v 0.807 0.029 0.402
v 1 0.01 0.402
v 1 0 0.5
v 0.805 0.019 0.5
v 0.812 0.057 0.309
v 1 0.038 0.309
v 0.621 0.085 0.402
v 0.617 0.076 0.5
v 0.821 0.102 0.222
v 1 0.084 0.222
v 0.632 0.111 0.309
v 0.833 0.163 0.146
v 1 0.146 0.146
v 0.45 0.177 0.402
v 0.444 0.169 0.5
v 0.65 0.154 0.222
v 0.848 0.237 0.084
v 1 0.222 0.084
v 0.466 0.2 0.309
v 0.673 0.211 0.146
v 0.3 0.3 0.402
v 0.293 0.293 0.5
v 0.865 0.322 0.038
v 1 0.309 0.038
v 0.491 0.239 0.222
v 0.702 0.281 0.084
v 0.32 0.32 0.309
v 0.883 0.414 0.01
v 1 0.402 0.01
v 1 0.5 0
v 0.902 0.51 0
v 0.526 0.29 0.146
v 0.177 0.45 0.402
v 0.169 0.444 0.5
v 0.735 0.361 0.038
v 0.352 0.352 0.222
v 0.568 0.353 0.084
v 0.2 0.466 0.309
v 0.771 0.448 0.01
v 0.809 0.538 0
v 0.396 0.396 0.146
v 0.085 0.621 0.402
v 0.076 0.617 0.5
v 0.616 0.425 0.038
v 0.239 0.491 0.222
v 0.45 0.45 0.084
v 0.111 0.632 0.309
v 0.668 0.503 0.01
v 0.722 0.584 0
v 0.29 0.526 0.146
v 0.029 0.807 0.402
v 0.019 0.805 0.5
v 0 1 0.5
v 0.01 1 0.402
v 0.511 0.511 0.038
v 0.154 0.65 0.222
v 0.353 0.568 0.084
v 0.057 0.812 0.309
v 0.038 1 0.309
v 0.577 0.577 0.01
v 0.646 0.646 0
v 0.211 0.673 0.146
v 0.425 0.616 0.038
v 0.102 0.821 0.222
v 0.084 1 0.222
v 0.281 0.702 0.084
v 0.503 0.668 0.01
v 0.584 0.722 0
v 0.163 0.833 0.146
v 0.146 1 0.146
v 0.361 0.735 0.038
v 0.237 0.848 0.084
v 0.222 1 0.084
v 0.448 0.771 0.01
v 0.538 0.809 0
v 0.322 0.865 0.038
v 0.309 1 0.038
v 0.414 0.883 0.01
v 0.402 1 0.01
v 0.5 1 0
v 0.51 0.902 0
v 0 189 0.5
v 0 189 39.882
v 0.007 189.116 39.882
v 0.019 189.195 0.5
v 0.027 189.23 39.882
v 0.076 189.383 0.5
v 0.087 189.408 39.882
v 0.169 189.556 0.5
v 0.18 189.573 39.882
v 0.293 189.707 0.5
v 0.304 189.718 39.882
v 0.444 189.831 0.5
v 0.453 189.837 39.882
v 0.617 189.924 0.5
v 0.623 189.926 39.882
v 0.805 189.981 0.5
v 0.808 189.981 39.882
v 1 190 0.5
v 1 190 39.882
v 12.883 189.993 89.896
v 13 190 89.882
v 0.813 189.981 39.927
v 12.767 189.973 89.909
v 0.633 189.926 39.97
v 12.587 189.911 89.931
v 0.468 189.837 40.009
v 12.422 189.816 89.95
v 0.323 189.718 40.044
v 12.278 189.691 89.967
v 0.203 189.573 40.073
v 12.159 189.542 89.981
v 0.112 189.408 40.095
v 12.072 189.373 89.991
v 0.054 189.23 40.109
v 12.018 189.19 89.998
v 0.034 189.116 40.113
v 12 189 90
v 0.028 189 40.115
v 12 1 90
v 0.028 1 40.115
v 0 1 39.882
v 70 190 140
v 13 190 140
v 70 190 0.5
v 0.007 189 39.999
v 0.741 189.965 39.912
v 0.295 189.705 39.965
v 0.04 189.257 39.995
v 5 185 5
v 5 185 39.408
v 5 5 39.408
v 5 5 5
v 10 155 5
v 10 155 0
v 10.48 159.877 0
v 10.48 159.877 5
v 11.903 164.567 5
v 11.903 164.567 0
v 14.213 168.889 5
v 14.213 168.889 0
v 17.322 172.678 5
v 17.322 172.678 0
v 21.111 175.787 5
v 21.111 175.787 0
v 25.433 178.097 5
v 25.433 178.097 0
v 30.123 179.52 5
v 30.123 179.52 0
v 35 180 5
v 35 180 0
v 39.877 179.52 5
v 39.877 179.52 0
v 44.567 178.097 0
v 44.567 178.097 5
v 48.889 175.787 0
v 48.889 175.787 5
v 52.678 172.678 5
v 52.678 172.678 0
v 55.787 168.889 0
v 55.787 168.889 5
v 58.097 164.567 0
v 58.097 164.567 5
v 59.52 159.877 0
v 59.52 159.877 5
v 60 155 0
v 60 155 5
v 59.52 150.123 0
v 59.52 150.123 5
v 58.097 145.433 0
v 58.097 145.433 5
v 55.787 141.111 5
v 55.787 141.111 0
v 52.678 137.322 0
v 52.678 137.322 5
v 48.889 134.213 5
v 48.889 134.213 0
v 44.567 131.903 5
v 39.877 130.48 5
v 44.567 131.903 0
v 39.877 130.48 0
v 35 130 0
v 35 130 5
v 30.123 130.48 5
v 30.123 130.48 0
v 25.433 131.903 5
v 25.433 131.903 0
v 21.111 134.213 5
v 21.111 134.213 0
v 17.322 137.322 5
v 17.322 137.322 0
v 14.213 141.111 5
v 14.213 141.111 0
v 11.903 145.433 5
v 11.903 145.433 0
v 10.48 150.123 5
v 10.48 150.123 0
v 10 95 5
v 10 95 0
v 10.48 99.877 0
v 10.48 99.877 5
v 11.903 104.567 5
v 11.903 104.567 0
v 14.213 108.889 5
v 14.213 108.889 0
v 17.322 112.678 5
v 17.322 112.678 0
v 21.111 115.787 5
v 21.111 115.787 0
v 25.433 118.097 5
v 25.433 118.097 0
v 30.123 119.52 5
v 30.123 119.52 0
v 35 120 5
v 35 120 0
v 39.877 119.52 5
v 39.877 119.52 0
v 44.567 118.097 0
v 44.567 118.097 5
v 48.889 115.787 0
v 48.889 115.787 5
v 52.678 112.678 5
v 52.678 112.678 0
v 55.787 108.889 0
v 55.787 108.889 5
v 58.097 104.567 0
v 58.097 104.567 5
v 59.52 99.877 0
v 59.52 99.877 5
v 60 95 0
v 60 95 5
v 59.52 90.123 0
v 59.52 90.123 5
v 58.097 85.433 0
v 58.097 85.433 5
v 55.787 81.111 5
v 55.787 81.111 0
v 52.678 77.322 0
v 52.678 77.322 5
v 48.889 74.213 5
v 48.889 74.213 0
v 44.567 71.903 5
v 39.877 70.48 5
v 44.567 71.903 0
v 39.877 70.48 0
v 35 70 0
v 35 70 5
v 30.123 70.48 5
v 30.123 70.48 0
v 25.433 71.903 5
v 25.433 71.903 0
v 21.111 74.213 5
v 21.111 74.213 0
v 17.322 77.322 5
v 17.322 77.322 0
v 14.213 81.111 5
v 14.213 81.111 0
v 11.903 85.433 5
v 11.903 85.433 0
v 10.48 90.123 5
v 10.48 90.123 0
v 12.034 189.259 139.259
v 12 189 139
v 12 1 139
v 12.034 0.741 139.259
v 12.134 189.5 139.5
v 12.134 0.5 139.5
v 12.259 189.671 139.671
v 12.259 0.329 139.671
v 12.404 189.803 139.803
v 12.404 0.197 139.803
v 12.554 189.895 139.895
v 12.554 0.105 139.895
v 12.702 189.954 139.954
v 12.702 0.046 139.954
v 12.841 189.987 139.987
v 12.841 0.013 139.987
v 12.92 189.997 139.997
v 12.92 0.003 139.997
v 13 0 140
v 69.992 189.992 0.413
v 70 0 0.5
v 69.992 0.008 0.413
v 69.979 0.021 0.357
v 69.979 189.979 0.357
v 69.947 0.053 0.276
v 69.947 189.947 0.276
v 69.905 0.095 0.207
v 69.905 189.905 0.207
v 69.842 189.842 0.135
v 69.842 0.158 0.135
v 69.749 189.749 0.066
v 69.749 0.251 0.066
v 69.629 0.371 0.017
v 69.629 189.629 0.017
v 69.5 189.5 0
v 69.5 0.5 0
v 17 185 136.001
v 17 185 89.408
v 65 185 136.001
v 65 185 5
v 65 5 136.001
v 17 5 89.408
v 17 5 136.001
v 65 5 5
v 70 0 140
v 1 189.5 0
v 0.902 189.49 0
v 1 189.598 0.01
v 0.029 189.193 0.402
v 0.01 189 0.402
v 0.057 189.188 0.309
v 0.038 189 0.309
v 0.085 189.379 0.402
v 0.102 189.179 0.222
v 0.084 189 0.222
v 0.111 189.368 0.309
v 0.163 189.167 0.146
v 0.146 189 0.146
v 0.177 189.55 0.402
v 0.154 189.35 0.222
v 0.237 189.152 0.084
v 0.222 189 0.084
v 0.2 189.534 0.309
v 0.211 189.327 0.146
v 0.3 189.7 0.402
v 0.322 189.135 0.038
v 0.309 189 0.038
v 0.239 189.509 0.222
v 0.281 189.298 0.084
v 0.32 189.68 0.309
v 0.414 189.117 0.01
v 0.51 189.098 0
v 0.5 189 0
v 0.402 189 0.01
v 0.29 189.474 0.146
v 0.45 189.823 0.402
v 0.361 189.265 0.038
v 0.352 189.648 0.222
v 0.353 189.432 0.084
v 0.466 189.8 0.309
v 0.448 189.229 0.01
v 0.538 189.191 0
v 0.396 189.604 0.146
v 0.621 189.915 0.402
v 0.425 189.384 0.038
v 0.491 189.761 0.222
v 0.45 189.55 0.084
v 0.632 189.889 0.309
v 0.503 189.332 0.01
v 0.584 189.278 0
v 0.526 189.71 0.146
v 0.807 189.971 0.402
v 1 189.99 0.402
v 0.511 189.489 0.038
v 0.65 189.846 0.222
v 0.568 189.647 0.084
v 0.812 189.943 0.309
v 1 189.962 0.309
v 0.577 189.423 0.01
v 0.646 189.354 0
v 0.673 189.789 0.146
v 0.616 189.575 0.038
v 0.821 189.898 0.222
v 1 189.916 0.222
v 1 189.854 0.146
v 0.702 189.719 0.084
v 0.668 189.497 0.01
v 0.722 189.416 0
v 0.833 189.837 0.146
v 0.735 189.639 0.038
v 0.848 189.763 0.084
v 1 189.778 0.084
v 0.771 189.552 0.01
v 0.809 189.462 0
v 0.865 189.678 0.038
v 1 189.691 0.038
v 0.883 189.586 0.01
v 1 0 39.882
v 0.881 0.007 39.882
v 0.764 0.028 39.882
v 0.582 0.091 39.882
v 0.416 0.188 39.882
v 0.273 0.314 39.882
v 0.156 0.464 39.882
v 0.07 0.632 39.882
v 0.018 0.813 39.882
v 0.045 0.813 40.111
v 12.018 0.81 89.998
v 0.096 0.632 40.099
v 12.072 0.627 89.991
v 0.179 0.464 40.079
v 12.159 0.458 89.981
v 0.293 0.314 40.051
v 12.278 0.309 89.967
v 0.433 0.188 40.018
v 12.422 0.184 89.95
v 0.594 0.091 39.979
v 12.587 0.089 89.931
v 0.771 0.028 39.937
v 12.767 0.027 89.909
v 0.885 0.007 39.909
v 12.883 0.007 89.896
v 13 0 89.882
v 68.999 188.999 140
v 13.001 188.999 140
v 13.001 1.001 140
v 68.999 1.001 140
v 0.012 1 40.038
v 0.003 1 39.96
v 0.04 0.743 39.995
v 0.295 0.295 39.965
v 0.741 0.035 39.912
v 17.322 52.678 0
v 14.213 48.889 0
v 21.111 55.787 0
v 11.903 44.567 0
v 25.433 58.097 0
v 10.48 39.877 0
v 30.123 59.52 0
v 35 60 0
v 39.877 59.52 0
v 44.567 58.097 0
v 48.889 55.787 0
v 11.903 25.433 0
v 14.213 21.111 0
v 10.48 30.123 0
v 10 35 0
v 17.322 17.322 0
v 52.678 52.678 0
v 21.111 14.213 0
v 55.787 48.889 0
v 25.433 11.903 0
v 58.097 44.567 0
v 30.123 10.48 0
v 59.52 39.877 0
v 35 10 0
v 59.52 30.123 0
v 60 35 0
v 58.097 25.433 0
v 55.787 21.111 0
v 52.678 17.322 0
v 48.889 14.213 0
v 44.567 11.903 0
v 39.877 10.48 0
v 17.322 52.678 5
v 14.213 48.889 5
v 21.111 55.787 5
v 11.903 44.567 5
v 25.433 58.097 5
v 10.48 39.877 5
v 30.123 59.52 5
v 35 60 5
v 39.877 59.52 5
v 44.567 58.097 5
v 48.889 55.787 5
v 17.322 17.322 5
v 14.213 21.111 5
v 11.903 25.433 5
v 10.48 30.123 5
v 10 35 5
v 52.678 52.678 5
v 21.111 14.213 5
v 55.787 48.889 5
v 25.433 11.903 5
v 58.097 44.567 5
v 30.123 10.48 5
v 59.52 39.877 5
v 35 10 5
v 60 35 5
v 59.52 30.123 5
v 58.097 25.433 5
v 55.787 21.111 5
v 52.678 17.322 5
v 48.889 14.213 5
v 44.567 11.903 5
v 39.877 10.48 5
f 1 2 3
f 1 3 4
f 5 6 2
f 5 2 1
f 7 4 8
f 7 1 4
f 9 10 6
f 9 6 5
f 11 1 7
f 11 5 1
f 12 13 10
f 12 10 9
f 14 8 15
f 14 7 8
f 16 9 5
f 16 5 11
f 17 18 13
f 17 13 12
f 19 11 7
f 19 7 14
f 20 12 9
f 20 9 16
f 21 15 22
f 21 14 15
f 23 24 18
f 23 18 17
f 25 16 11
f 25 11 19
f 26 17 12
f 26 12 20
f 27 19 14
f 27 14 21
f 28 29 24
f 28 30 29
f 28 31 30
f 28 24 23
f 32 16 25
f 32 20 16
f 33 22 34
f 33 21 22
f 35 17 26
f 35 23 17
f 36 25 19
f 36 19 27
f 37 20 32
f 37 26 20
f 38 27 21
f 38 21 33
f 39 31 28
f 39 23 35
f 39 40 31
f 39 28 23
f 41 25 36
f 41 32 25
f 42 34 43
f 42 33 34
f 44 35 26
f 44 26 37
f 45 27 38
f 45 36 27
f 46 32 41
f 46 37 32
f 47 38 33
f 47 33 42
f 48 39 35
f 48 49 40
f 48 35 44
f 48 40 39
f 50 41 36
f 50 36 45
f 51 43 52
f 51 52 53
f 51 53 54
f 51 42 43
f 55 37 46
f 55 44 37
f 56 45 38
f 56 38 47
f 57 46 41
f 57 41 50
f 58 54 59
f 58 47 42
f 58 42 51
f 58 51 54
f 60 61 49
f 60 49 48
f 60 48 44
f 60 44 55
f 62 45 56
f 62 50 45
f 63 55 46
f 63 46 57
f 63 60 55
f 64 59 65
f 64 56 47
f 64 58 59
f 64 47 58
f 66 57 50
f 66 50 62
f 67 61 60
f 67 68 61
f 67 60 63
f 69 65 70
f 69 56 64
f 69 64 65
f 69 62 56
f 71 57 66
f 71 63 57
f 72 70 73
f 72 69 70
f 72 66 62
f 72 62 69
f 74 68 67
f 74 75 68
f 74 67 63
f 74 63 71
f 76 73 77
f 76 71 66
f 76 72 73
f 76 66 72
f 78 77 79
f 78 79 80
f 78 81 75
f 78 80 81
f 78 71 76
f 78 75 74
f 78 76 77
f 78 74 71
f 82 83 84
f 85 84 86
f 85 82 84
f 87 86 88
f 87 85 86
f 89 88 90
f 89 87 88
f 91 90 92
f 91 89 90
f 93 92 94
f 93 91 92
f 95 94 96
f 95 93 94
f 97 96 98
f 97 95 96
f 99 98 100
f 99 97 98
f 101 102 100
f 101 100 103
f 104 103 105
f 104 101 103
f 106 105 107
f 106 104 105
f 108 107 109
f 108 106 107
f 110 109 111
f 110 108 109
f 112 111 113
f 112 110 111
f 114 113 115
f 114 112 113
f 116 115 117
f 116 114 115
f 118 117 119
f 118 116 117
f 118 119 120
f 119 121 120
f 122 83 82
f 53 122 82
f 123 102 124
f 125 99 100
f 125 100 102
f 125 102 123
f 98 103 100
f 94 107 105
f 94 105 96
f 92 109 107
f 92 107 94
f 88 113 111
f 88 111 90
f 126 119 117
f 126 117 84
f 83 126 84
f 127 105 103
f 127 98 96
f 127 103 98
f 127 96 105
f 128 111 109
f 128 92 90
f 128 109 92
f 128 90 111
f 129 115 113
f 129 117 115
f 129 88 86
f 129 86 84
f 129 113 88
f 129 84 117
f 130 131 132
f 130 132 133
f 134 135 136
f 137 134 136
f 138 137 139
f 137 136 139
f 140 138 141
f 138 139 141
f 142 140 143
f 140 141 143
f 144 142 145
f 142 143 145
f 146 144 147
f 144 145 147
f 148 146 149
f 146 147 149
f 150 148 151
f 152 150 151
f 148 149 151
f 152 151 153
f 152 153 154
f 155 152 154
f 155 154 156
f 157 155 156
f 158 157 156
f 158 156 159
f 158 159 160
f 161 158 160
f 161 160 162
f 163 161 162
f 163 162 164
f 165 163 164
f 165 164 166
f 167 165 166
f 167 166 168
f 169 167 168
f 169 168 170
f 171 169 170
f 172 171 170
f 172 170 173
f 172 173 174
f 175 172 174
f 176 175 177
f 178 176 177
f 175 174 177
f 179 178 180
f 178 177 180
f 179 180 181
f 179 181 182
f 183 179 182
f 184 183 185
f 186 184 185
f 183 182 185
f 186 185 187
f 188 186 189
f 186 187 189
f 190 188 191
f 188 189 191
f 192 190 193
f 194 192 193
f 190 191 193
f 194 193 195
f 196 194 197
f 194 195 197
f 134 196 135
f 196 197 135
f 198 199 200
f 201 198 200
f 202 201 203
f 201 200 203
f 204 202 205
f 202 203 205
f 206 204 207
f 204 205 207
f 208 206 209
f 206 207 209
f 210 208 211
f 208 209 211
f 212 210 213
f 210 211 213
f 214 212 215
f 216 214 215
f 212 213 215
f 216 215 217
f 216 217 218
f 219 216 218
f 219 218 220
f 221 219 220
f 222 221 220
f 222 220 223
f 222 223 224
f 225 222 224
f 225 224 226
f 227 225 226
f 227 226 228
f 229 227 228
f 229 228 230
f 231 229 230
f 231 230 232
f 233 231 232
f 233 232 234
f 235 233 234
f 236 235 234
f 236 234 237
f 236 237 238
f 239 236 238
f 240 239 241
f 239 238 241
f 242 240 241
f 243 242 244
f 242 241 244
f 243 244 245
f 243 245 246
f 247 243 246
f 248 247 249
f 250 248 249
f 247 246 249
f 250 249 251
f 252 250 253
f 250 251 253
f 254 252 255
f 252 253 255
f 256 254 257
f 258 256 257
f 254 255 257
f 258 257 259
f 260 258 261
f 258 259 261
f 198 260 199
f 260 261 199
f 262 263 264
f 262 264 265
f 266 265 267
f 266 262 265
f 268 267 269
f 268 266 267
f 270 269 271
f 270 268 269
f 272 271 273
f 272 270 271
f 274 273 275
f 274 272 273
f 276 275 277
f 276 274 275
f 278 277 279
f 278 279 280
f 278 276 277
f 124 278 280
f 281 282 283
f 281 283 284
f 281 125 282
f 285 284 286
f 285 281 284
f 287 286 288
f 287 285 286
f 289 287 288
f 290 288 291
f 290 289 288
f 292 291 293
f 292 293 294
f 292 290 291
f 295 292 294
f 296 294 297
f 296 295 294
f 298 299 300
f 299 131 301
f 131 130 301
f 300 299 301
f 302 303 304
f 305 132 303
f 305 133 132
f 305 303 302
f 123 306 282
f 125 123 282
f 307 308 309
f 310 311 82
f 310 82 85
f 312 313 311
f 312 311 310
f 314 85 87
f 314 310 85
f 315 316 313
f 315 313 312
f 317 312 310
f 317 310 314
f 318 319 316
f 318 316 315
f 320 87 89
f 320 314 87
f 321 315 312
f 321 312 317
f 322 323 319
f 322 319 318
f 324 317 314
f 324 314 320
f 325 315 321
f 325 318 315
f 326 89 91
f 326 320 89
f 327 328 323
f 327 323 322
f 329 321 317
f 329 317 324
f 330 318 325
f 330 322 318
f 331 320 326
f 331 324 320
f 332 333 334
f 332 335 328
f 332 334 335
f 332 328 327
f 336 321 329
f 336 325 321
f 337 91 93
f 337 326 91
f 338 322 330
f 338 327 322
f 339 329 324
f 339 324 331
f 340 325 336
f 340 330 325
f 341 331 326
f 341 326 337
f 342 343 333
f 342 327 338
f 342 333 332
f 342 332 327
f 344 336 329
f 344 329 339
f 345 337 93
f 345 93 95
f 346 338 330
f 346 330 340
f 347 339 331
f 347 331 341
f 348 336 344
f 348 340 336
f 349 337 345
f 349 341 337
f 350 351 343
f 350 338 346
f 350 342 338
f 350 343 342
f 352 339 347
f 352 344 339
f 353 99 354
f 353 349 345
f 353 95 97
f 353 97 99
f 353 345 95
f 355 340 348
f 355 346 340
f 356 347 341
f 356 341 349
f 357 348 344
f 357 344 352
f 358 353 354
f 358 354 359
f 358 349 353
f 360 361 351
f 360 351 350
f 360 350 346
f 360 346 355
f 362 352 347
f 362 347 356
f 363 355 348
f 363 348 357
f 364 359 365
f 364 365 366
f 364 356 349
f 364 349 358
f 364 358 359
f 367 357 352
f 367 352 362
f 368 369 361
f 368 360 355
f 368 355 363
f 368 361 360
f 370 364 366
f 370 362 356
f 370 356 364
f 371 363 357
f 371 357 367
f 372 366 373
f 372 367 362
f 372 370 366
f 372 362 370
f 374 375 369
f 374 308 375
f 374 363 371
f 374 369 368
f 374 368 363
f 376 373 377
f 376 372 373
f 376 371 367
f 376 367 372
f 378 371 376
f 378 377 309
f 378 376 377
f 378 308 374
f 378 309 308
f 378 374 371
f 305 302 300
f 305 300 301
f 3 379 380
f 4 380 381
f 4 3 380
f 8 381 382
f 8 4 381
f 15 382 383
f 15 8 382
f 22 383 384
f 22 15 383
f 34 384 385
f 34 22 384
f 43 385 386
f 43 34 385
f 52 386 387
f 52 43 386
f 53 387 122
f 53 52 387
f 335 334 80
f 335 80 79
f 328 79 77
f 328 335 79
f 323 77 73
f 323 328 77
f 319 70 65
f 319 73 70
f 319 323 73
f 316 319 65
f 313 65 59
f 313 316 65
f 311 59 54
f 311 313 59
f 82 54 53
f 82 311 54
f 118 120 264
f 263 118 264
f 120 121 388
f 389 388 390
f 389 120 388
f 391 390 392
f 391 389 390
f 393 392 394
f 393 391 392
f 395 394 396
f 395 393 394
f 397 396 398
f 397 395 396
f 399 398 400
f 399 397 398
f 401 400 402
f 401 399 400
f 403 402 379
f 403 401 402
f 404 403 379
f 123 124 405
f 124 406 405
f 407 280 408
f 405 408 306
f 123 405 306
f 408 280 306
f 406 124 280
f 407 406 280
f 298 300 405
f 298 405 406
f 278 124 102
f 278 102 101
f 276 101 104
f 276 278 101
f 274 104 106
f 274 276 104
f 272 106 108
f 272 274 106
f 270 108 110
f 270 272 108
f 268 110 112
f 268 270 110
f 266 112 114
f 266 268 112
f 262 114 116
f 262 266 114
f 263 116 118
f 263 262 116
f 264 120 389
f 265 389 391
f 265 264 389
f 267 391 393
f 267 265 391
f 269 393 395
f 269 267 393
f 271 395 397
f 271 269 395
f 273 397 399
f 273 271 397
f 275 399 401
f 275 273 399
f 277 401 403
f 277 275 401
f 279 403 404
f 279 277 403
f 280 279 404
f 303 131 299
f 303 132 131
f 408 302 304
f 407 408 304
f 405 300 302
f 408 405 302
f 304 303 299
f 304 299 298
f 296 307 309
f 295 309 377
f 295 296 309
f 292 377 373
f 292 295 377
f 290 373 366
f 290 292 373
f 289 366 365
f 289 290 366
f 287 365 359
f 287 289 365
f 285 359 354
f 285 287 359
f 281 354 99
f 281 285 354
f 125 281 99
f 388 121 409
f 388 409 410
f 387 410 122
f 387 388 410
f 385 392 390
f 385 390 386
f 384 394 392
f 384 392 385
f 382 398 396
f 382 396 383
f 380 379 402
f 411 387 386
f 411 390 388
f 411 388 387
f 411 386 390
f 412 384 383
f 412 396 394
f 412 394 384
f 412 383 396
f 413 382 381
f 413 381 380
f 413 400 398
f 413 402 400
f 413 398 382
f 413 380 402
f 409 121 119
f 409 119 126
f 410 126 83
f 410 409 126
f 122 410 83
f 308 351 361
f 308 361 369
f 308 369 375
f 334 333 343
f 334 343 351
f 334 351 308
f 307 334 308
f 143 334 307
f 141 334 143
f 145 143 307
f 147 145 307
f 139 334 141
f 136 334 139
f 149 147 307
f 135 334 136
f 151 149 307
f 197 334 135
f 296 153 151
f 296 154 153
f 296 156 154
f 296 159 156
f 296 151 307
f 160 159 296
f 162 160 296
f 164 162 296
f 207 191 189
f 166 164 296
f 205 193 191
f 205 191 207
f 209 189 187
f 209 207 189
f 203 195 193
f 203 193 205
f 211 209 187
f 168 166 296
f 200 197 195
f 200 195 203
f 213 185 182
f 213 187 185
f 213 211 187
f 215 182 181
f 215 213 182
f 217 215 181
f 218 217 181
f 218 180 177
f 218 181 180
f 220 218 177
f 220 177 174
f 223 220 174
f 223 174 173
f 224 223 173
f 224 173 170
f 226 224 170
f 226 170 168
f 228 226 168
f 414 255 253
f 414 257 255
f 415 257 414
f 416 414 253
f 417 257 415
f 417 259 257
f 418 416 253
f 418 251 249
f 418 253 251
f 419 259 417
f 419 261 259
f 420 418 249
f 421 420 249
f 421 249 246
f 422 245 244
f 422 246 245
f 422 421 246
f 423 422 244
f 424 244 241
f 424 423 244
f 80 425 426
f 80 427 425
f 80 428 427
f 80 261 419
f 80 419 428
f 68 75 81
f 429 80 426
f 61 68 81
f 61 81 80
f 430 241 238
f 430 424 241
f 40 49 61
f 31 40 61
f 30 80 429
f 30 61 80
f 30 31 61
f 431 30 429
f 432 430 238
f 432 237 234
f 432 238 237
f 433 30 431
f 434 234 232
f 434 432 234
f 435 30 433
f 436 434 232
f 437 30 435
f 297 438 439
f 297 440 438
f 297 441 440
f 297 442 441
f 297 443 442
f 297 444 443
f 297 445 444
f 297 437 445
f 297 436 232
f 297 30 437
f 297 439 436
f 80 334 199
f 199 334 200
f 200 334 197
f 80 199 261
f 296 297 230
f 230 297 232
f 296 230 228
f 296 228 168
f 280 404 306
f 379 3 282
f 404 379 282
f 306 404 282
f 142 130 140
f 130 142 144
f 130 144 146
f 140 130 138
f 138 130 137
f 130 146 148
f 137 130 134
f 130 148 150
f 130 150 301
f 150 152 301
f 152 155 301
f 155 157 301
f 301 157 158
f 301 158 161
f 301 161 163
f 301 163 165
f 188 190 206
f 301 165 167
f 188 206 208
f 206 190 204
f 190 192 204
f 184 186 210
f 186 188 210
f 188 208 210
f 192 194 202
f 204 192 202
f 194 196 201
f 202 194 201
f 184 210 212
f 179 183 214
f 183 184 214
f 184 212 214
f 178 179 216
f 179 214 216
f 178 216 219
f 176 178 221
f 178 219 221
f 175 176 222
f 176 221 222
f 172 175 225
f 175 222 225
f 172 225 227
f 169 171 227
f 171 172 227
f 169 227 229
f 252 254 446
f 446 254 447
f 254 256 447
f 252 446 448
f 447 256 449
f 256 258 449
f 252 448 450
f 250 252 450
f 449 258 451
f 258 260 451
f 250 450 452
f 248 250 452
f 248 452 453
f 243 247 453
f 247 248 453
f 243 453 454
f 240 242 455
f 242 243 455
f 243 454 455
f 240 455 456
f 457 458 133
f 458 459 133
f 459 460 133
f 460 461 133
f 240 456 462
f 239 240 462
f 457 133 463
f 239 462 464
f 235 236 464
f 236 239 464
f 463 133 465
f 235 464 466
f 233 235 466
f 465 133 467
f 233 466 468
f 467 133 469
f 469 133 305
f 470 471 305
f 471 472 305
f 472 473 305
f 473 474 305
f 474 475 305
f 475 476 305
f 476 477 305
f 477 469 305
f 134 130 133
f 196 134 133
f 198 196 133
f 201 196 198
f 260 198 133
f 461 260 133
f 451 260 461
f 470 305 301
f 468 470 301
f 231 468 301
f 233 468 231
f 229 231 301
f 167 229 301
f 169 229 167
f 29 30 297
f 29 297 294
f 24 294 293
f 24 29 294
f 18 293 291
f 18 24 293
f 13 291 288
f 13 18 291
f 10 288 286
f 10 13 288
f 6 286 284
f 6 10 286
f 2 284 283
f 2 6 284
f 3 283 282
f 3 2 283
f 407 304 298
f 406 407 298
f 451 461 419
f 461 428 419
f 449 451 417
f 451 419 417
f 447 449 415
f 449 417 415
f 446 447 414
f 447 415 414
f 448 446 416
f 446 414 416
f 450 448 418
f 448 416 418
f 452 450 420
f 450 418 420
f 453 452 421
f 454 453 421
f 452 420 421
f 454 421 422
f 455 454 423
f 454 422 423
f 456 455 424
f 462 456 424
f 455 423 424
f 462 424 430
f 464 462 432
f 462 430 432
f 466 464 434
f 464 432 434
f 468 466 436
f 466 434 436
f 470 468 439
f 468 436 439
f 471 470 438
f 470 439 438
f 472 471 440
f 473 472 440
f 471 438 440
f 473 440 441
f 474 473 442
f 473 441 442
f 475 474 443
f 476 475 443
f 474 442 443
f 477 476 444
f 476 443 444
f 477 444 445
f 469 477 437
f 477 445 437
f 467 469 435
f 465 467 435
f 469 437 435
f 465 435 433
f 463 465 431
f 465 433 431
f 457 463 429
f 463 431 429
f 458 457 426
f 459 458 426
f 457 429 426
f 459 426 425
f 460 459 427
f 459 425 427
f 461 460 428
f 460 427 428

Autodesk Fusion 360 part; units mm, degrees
sketch "Sketch1" plane through (0, 0, 0) normal (0, 1, 0) x (1, 0, 0)
  line L0 (0, 0) -> (70, 0)
  line L1 (70, 0) -> (70, -40)
  line L2 (0, -40) -> (0, 0)
  line L3 (70, -40) -> (12, -40)
  line L4 (70, -90) -> (70, -40)
  line L5 (0, -40) -> (12, -90)
  line L6 (12, -90) -> (12, -140)
  line L7 (12, -140) -> (70, -140)
  line L8 (70, -140) -> (70, -90)
  dimension "d1" = 70
  dimension "d2" = 40
  dimension "d3" = 58
  dimension "d4" = 50
  dimension "d5" = 58
  dimension "d6" = 50
extrude "Extrude1" add sketch "Sketch1" along normal blind 190
sketch "Sketch2" plane through (0, 0, 0) normal (0, 0, -1) x (-1, 0, 0)
  line L0 (-70, 0) -> (0, 0)
  line L1 (0, 0) -> (0, 190)
  line L2 (0, 190) -> (-70, 190)
  line L3 (-70, 190) -> (-70, 0)
sketch "Sketch4" plane through (0, 0, 0) normal (0, 0, -1) x (-1, 0, 0)
  circle A0 centre (-35, 155) radius 25
  line L0 (0, 190) -> (-70, 190)
  line L1 (0, 0) -> (0, 190)
  circle A1 centre (-35, 95) radius 25
  circle A2 centre (-35, 35) radius 25
  dimension "d21" = 50
  dimension "d22" = 35
  dimension "d23" = 35
  dimension "d24" = 50
  dimension "d25" = 35
  dimension "d26" = 60
  dimension "d27" = 50
  dimension "d28" = 35
  dimension "d29" = 60
shell "Shell1" thickness 5 removed faces 1 at (31.3333, 63.3333, 140)
extrude "Extrude2" cut sketch "Sketch4" against normal blind 25
fillet "Fillet1" radius 1 7 edges at (12, 190, 115) (6, 190, 65) (0, 190, 20) (12, 95, 140) (12, 0, 115) (6, 0, 65) (0, 0, 20)
fillet "Fillet2" radius 1 3 edges at (0.2929, 0.2929, 39.9653) (0, 95, 40) (0.2929, 189.7071, 39.9653)
chamfer "Chamfer1" distance 4 angle 45 4 edges at (65, 95, 140) (41, 185, 140) (17, 95, 140) (41, 5, 140)
fillet "Fillet3" radius 0.5 6 edges at (70, 95, 0) (35.5, 190, 0) (0.2929, 189.7071, 0) (0, 95, 0) (0.2929, 0.2929, 0) (35.5, 0, 0)
